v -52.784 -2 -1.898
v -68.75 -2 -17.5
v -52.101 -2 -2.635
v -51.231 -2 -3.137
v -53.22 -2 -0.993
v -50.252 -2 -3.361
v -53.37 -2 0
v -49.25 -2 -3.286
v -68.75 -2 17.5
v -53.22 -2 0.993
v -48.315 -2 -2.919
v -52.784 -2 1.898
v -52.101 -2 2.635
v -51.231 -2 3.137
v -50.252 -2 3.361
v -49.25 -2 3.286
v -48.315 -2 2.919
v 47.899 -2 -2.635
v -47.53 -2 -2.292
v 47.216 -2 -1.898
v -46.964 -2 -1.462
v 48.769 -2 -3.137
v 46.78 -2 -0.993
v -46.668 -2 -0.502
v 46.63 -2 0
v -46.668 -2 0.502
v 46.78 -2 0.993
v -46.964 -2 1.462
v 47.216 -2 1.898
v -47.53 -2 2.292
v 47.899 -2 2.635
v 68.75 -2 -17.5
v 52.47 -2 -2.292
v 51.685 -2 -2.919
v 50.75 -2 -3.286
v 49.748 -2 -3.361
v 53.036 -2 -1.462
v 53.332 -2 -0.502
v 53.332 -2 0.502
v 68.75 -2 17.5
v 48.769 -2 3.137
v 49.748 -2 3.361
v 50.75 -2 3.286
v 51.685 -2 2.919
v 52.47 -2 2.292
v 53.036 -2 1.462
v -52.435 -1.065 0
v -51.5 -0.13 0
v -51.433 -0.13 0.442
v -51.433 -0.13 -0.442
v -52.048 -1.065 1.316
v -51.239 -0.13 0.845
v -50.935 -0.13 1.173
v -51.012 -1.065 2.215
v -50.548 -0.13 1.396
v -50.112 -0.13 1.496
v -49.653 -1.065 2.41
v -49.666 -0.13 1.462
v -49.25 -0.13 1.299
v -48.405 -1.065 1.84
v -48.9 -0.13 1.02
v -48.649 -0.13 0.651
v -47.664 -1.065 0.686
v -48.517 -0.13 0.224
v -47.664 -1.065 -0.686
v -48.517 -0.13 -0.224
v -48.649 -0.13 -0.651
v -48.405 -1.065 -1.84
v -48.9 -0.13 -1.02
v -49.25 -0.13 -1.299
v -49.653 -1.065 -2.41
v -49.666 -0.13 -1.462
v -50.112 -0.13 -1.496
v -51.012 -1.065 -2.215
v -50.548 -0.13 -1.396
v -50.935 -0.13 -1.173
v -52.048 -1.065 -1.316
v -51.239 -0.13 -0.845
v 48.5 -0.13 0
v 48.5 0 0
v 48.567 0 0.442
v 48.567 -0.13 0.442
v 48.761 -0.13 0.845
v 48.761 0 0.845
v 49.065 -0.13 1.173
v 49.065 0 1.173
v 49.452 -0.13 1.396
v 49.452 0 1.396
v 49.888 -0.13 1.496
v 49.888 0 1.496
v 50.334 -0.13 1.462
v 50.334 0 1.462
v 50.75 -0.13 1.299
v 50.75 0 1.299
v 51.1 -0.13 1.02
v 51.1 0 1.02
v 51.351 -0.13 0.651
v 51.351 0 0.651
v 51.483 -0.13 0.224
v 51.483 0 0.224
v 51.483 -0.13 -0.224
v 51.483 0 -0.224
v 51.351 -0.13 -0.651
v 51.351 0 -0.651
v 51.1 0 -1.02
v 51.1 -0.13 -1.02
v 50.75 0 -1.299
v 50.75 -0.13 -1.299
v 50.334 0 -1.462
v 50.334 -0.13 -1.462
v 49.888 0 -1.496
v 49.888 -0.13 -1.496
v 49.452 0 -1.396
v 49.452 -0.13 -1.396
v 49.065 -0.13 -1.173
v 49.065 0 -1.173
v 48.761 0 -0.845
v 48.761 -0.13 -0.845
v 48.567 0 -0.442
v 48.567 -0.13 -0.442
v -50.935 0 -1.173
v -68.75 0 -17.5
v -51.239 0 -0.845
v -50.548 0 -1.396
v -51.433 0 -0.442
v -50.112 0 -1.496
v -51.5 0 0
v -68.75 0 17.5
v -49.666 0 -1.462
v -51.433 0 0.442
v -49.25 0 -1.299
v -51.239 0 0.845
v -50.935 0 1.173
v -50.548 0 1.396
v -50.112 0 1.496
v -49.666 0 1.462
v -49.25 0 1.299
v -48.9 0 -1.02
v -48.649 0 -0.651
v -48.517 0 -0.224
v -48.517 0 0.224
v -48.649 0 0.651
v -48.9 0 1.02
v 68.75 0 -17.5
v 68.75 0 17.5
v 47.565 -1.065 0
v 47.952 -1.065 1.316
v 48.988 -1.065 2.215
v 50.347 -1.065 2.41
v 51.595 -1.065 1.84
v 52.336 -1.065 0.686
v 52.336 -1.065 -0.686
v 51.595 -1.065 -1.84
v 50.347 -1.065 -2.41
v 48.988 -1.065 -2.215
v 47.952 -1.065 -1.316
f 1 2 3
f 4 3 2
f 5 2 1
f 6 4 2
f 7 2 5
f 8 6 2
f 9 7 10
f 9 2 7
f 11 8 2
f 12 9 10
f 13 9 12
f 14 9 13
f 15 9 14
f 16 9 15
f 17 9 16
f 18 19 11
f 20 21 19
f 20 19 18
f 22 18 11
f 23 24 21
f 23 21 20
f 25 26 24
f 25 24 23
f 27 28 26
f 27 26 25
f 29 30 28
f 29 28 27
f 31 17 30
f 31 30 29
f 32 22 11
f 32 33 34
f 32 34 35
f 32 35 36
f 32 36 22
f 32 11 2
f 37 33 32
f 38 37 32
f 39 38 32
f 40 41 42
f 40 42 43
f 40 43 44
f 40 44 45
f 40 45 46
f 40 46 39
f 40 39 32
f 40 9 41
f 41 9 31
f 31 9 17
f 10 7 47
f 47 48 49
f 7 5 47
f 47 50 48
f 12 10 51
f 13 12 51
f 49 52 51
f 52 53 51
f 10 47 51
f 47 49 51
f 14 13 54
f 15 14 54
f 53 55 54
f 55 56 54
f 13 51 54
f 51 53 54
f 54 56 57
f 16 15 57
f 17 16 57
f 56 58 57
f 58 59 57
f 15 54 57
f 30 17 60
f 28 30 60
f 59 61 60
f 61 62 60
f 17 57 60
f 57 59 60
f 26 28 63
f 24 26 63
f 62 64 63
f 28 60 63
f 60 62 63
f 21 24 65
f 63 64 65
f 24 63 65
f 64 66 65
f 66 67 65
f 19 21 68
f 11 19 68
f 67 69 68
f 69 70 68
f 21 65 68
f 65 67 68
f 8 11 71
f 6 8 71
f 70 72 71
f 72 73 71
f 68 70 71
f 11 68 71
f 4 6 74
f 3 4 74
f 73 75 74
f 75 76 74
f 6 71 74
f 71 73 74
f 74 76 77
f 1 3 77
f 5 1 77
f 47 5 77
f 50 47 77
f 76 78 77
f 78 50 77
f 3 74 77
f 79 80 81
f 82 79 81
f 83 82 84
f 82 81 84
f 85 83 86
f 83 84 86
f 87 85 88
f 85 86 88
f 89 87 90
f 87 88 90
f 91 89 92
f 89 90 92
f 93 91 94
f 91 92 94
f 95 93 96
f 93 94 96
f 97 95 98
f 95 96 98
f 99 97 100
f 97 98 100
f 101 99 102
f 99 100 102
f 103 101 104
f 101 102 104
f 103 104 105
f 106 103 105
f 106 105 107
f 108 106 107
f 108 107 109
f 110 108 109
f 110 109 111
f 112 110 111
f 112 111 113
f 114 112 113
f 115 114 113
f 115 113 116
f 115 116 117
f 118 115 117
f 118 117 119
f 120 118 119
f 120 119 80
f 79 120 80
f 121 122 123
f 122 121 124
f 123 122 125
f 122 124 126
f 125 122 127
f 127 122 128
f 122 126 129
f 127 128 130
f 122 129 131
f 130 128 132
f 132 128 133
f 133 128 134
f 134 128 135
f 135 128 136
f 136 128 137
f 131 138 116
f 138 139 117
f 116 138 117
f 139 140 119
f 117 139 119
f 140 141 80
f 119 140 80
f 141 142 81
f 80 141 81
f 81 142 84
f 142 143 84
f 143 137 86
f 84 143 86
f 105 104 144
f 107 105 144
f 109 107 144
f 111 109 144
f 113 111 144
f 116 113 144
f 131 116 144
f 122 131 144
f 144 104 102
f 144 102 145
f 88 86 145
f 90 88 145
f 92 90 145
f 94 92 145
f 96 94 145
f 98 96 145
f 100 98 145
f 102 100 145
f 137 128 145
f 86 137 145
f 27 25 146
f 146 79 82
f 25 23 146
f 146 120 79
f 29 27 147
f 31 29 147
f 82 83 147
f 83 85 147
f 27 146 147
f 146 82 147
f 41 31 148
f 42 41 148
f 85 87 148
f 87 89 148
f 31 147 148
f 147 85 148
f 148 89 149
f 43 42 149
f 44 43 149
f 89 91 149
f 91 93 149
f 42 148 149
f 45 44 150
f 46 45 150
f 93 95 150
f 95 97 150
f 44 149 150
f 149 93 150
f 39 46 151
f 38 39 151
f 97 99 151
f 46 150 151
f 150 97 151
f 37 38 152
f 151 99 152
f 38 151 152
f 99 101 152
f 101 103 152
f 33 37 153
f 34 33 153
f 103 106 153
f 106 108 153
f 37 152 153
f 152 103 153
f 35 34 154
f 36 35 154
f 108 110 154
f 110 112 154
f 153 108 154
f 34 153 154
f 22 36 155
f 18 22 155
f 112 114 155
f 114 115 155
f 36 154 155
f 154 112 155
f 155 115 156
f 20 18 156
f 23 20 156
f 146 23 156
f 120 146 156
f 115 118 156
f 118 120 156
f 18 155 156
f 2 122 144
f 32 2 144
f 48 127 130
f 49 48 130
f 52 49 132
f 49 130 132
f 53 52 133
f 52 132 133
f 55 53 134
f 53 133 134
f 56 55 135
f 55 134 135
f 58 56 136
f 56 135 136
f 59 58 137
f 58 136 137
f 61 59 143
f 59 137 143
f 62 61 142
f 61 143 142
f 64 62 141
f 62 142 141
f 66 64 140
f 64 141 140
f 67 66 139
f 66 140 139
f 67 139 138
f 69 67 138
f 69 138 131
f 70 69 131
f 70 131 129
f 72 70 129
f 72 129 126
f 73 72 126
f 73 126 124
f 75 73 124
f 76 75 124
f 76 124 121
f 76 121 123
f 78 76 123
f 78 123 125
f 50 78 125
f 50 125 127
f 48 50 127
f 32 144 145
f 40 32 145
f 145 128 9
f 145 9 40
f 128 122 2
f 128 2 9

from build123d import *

# Parameters (mm, degrees)
F0_W     = 137.5
F0_H     = 35
F1_DEPTH = 2
F2_R     = 1.5
F3_DEPTH = 25
F4_SIZE  = 1.87


with BuildPart() as f1:
    # F0 (on Front) → F1 (new body)
    with BuildSketch(Plane.XZ):
        Rectangle(F0_W, F0_H)
    extrude(amount=F1_DEPTH)

    # F2 (on face) → F3 (cut)
    with BuildSketch(Plane(origin=(0, 0, 0), x_dir=(-1, 0, 0), z_dir=(0, 1, 0))):
        with Locations((-50, 0)):
            Circle(F2_R)
        with Locations((50, 0)):
            Circle(F2_R)
    extrude(amount=-F3_DEPTH, mode=Mode.SUBTRACT)

    # F4
    f4_edges = [f1.edges().sort_by_distance(p)[0] for p in [
        (51.5, -2, 0),
        (-48.5, -2, 0),
    ]]
    chamfer(f4_edges, length=F4_SIZE)


solid = f1.part
